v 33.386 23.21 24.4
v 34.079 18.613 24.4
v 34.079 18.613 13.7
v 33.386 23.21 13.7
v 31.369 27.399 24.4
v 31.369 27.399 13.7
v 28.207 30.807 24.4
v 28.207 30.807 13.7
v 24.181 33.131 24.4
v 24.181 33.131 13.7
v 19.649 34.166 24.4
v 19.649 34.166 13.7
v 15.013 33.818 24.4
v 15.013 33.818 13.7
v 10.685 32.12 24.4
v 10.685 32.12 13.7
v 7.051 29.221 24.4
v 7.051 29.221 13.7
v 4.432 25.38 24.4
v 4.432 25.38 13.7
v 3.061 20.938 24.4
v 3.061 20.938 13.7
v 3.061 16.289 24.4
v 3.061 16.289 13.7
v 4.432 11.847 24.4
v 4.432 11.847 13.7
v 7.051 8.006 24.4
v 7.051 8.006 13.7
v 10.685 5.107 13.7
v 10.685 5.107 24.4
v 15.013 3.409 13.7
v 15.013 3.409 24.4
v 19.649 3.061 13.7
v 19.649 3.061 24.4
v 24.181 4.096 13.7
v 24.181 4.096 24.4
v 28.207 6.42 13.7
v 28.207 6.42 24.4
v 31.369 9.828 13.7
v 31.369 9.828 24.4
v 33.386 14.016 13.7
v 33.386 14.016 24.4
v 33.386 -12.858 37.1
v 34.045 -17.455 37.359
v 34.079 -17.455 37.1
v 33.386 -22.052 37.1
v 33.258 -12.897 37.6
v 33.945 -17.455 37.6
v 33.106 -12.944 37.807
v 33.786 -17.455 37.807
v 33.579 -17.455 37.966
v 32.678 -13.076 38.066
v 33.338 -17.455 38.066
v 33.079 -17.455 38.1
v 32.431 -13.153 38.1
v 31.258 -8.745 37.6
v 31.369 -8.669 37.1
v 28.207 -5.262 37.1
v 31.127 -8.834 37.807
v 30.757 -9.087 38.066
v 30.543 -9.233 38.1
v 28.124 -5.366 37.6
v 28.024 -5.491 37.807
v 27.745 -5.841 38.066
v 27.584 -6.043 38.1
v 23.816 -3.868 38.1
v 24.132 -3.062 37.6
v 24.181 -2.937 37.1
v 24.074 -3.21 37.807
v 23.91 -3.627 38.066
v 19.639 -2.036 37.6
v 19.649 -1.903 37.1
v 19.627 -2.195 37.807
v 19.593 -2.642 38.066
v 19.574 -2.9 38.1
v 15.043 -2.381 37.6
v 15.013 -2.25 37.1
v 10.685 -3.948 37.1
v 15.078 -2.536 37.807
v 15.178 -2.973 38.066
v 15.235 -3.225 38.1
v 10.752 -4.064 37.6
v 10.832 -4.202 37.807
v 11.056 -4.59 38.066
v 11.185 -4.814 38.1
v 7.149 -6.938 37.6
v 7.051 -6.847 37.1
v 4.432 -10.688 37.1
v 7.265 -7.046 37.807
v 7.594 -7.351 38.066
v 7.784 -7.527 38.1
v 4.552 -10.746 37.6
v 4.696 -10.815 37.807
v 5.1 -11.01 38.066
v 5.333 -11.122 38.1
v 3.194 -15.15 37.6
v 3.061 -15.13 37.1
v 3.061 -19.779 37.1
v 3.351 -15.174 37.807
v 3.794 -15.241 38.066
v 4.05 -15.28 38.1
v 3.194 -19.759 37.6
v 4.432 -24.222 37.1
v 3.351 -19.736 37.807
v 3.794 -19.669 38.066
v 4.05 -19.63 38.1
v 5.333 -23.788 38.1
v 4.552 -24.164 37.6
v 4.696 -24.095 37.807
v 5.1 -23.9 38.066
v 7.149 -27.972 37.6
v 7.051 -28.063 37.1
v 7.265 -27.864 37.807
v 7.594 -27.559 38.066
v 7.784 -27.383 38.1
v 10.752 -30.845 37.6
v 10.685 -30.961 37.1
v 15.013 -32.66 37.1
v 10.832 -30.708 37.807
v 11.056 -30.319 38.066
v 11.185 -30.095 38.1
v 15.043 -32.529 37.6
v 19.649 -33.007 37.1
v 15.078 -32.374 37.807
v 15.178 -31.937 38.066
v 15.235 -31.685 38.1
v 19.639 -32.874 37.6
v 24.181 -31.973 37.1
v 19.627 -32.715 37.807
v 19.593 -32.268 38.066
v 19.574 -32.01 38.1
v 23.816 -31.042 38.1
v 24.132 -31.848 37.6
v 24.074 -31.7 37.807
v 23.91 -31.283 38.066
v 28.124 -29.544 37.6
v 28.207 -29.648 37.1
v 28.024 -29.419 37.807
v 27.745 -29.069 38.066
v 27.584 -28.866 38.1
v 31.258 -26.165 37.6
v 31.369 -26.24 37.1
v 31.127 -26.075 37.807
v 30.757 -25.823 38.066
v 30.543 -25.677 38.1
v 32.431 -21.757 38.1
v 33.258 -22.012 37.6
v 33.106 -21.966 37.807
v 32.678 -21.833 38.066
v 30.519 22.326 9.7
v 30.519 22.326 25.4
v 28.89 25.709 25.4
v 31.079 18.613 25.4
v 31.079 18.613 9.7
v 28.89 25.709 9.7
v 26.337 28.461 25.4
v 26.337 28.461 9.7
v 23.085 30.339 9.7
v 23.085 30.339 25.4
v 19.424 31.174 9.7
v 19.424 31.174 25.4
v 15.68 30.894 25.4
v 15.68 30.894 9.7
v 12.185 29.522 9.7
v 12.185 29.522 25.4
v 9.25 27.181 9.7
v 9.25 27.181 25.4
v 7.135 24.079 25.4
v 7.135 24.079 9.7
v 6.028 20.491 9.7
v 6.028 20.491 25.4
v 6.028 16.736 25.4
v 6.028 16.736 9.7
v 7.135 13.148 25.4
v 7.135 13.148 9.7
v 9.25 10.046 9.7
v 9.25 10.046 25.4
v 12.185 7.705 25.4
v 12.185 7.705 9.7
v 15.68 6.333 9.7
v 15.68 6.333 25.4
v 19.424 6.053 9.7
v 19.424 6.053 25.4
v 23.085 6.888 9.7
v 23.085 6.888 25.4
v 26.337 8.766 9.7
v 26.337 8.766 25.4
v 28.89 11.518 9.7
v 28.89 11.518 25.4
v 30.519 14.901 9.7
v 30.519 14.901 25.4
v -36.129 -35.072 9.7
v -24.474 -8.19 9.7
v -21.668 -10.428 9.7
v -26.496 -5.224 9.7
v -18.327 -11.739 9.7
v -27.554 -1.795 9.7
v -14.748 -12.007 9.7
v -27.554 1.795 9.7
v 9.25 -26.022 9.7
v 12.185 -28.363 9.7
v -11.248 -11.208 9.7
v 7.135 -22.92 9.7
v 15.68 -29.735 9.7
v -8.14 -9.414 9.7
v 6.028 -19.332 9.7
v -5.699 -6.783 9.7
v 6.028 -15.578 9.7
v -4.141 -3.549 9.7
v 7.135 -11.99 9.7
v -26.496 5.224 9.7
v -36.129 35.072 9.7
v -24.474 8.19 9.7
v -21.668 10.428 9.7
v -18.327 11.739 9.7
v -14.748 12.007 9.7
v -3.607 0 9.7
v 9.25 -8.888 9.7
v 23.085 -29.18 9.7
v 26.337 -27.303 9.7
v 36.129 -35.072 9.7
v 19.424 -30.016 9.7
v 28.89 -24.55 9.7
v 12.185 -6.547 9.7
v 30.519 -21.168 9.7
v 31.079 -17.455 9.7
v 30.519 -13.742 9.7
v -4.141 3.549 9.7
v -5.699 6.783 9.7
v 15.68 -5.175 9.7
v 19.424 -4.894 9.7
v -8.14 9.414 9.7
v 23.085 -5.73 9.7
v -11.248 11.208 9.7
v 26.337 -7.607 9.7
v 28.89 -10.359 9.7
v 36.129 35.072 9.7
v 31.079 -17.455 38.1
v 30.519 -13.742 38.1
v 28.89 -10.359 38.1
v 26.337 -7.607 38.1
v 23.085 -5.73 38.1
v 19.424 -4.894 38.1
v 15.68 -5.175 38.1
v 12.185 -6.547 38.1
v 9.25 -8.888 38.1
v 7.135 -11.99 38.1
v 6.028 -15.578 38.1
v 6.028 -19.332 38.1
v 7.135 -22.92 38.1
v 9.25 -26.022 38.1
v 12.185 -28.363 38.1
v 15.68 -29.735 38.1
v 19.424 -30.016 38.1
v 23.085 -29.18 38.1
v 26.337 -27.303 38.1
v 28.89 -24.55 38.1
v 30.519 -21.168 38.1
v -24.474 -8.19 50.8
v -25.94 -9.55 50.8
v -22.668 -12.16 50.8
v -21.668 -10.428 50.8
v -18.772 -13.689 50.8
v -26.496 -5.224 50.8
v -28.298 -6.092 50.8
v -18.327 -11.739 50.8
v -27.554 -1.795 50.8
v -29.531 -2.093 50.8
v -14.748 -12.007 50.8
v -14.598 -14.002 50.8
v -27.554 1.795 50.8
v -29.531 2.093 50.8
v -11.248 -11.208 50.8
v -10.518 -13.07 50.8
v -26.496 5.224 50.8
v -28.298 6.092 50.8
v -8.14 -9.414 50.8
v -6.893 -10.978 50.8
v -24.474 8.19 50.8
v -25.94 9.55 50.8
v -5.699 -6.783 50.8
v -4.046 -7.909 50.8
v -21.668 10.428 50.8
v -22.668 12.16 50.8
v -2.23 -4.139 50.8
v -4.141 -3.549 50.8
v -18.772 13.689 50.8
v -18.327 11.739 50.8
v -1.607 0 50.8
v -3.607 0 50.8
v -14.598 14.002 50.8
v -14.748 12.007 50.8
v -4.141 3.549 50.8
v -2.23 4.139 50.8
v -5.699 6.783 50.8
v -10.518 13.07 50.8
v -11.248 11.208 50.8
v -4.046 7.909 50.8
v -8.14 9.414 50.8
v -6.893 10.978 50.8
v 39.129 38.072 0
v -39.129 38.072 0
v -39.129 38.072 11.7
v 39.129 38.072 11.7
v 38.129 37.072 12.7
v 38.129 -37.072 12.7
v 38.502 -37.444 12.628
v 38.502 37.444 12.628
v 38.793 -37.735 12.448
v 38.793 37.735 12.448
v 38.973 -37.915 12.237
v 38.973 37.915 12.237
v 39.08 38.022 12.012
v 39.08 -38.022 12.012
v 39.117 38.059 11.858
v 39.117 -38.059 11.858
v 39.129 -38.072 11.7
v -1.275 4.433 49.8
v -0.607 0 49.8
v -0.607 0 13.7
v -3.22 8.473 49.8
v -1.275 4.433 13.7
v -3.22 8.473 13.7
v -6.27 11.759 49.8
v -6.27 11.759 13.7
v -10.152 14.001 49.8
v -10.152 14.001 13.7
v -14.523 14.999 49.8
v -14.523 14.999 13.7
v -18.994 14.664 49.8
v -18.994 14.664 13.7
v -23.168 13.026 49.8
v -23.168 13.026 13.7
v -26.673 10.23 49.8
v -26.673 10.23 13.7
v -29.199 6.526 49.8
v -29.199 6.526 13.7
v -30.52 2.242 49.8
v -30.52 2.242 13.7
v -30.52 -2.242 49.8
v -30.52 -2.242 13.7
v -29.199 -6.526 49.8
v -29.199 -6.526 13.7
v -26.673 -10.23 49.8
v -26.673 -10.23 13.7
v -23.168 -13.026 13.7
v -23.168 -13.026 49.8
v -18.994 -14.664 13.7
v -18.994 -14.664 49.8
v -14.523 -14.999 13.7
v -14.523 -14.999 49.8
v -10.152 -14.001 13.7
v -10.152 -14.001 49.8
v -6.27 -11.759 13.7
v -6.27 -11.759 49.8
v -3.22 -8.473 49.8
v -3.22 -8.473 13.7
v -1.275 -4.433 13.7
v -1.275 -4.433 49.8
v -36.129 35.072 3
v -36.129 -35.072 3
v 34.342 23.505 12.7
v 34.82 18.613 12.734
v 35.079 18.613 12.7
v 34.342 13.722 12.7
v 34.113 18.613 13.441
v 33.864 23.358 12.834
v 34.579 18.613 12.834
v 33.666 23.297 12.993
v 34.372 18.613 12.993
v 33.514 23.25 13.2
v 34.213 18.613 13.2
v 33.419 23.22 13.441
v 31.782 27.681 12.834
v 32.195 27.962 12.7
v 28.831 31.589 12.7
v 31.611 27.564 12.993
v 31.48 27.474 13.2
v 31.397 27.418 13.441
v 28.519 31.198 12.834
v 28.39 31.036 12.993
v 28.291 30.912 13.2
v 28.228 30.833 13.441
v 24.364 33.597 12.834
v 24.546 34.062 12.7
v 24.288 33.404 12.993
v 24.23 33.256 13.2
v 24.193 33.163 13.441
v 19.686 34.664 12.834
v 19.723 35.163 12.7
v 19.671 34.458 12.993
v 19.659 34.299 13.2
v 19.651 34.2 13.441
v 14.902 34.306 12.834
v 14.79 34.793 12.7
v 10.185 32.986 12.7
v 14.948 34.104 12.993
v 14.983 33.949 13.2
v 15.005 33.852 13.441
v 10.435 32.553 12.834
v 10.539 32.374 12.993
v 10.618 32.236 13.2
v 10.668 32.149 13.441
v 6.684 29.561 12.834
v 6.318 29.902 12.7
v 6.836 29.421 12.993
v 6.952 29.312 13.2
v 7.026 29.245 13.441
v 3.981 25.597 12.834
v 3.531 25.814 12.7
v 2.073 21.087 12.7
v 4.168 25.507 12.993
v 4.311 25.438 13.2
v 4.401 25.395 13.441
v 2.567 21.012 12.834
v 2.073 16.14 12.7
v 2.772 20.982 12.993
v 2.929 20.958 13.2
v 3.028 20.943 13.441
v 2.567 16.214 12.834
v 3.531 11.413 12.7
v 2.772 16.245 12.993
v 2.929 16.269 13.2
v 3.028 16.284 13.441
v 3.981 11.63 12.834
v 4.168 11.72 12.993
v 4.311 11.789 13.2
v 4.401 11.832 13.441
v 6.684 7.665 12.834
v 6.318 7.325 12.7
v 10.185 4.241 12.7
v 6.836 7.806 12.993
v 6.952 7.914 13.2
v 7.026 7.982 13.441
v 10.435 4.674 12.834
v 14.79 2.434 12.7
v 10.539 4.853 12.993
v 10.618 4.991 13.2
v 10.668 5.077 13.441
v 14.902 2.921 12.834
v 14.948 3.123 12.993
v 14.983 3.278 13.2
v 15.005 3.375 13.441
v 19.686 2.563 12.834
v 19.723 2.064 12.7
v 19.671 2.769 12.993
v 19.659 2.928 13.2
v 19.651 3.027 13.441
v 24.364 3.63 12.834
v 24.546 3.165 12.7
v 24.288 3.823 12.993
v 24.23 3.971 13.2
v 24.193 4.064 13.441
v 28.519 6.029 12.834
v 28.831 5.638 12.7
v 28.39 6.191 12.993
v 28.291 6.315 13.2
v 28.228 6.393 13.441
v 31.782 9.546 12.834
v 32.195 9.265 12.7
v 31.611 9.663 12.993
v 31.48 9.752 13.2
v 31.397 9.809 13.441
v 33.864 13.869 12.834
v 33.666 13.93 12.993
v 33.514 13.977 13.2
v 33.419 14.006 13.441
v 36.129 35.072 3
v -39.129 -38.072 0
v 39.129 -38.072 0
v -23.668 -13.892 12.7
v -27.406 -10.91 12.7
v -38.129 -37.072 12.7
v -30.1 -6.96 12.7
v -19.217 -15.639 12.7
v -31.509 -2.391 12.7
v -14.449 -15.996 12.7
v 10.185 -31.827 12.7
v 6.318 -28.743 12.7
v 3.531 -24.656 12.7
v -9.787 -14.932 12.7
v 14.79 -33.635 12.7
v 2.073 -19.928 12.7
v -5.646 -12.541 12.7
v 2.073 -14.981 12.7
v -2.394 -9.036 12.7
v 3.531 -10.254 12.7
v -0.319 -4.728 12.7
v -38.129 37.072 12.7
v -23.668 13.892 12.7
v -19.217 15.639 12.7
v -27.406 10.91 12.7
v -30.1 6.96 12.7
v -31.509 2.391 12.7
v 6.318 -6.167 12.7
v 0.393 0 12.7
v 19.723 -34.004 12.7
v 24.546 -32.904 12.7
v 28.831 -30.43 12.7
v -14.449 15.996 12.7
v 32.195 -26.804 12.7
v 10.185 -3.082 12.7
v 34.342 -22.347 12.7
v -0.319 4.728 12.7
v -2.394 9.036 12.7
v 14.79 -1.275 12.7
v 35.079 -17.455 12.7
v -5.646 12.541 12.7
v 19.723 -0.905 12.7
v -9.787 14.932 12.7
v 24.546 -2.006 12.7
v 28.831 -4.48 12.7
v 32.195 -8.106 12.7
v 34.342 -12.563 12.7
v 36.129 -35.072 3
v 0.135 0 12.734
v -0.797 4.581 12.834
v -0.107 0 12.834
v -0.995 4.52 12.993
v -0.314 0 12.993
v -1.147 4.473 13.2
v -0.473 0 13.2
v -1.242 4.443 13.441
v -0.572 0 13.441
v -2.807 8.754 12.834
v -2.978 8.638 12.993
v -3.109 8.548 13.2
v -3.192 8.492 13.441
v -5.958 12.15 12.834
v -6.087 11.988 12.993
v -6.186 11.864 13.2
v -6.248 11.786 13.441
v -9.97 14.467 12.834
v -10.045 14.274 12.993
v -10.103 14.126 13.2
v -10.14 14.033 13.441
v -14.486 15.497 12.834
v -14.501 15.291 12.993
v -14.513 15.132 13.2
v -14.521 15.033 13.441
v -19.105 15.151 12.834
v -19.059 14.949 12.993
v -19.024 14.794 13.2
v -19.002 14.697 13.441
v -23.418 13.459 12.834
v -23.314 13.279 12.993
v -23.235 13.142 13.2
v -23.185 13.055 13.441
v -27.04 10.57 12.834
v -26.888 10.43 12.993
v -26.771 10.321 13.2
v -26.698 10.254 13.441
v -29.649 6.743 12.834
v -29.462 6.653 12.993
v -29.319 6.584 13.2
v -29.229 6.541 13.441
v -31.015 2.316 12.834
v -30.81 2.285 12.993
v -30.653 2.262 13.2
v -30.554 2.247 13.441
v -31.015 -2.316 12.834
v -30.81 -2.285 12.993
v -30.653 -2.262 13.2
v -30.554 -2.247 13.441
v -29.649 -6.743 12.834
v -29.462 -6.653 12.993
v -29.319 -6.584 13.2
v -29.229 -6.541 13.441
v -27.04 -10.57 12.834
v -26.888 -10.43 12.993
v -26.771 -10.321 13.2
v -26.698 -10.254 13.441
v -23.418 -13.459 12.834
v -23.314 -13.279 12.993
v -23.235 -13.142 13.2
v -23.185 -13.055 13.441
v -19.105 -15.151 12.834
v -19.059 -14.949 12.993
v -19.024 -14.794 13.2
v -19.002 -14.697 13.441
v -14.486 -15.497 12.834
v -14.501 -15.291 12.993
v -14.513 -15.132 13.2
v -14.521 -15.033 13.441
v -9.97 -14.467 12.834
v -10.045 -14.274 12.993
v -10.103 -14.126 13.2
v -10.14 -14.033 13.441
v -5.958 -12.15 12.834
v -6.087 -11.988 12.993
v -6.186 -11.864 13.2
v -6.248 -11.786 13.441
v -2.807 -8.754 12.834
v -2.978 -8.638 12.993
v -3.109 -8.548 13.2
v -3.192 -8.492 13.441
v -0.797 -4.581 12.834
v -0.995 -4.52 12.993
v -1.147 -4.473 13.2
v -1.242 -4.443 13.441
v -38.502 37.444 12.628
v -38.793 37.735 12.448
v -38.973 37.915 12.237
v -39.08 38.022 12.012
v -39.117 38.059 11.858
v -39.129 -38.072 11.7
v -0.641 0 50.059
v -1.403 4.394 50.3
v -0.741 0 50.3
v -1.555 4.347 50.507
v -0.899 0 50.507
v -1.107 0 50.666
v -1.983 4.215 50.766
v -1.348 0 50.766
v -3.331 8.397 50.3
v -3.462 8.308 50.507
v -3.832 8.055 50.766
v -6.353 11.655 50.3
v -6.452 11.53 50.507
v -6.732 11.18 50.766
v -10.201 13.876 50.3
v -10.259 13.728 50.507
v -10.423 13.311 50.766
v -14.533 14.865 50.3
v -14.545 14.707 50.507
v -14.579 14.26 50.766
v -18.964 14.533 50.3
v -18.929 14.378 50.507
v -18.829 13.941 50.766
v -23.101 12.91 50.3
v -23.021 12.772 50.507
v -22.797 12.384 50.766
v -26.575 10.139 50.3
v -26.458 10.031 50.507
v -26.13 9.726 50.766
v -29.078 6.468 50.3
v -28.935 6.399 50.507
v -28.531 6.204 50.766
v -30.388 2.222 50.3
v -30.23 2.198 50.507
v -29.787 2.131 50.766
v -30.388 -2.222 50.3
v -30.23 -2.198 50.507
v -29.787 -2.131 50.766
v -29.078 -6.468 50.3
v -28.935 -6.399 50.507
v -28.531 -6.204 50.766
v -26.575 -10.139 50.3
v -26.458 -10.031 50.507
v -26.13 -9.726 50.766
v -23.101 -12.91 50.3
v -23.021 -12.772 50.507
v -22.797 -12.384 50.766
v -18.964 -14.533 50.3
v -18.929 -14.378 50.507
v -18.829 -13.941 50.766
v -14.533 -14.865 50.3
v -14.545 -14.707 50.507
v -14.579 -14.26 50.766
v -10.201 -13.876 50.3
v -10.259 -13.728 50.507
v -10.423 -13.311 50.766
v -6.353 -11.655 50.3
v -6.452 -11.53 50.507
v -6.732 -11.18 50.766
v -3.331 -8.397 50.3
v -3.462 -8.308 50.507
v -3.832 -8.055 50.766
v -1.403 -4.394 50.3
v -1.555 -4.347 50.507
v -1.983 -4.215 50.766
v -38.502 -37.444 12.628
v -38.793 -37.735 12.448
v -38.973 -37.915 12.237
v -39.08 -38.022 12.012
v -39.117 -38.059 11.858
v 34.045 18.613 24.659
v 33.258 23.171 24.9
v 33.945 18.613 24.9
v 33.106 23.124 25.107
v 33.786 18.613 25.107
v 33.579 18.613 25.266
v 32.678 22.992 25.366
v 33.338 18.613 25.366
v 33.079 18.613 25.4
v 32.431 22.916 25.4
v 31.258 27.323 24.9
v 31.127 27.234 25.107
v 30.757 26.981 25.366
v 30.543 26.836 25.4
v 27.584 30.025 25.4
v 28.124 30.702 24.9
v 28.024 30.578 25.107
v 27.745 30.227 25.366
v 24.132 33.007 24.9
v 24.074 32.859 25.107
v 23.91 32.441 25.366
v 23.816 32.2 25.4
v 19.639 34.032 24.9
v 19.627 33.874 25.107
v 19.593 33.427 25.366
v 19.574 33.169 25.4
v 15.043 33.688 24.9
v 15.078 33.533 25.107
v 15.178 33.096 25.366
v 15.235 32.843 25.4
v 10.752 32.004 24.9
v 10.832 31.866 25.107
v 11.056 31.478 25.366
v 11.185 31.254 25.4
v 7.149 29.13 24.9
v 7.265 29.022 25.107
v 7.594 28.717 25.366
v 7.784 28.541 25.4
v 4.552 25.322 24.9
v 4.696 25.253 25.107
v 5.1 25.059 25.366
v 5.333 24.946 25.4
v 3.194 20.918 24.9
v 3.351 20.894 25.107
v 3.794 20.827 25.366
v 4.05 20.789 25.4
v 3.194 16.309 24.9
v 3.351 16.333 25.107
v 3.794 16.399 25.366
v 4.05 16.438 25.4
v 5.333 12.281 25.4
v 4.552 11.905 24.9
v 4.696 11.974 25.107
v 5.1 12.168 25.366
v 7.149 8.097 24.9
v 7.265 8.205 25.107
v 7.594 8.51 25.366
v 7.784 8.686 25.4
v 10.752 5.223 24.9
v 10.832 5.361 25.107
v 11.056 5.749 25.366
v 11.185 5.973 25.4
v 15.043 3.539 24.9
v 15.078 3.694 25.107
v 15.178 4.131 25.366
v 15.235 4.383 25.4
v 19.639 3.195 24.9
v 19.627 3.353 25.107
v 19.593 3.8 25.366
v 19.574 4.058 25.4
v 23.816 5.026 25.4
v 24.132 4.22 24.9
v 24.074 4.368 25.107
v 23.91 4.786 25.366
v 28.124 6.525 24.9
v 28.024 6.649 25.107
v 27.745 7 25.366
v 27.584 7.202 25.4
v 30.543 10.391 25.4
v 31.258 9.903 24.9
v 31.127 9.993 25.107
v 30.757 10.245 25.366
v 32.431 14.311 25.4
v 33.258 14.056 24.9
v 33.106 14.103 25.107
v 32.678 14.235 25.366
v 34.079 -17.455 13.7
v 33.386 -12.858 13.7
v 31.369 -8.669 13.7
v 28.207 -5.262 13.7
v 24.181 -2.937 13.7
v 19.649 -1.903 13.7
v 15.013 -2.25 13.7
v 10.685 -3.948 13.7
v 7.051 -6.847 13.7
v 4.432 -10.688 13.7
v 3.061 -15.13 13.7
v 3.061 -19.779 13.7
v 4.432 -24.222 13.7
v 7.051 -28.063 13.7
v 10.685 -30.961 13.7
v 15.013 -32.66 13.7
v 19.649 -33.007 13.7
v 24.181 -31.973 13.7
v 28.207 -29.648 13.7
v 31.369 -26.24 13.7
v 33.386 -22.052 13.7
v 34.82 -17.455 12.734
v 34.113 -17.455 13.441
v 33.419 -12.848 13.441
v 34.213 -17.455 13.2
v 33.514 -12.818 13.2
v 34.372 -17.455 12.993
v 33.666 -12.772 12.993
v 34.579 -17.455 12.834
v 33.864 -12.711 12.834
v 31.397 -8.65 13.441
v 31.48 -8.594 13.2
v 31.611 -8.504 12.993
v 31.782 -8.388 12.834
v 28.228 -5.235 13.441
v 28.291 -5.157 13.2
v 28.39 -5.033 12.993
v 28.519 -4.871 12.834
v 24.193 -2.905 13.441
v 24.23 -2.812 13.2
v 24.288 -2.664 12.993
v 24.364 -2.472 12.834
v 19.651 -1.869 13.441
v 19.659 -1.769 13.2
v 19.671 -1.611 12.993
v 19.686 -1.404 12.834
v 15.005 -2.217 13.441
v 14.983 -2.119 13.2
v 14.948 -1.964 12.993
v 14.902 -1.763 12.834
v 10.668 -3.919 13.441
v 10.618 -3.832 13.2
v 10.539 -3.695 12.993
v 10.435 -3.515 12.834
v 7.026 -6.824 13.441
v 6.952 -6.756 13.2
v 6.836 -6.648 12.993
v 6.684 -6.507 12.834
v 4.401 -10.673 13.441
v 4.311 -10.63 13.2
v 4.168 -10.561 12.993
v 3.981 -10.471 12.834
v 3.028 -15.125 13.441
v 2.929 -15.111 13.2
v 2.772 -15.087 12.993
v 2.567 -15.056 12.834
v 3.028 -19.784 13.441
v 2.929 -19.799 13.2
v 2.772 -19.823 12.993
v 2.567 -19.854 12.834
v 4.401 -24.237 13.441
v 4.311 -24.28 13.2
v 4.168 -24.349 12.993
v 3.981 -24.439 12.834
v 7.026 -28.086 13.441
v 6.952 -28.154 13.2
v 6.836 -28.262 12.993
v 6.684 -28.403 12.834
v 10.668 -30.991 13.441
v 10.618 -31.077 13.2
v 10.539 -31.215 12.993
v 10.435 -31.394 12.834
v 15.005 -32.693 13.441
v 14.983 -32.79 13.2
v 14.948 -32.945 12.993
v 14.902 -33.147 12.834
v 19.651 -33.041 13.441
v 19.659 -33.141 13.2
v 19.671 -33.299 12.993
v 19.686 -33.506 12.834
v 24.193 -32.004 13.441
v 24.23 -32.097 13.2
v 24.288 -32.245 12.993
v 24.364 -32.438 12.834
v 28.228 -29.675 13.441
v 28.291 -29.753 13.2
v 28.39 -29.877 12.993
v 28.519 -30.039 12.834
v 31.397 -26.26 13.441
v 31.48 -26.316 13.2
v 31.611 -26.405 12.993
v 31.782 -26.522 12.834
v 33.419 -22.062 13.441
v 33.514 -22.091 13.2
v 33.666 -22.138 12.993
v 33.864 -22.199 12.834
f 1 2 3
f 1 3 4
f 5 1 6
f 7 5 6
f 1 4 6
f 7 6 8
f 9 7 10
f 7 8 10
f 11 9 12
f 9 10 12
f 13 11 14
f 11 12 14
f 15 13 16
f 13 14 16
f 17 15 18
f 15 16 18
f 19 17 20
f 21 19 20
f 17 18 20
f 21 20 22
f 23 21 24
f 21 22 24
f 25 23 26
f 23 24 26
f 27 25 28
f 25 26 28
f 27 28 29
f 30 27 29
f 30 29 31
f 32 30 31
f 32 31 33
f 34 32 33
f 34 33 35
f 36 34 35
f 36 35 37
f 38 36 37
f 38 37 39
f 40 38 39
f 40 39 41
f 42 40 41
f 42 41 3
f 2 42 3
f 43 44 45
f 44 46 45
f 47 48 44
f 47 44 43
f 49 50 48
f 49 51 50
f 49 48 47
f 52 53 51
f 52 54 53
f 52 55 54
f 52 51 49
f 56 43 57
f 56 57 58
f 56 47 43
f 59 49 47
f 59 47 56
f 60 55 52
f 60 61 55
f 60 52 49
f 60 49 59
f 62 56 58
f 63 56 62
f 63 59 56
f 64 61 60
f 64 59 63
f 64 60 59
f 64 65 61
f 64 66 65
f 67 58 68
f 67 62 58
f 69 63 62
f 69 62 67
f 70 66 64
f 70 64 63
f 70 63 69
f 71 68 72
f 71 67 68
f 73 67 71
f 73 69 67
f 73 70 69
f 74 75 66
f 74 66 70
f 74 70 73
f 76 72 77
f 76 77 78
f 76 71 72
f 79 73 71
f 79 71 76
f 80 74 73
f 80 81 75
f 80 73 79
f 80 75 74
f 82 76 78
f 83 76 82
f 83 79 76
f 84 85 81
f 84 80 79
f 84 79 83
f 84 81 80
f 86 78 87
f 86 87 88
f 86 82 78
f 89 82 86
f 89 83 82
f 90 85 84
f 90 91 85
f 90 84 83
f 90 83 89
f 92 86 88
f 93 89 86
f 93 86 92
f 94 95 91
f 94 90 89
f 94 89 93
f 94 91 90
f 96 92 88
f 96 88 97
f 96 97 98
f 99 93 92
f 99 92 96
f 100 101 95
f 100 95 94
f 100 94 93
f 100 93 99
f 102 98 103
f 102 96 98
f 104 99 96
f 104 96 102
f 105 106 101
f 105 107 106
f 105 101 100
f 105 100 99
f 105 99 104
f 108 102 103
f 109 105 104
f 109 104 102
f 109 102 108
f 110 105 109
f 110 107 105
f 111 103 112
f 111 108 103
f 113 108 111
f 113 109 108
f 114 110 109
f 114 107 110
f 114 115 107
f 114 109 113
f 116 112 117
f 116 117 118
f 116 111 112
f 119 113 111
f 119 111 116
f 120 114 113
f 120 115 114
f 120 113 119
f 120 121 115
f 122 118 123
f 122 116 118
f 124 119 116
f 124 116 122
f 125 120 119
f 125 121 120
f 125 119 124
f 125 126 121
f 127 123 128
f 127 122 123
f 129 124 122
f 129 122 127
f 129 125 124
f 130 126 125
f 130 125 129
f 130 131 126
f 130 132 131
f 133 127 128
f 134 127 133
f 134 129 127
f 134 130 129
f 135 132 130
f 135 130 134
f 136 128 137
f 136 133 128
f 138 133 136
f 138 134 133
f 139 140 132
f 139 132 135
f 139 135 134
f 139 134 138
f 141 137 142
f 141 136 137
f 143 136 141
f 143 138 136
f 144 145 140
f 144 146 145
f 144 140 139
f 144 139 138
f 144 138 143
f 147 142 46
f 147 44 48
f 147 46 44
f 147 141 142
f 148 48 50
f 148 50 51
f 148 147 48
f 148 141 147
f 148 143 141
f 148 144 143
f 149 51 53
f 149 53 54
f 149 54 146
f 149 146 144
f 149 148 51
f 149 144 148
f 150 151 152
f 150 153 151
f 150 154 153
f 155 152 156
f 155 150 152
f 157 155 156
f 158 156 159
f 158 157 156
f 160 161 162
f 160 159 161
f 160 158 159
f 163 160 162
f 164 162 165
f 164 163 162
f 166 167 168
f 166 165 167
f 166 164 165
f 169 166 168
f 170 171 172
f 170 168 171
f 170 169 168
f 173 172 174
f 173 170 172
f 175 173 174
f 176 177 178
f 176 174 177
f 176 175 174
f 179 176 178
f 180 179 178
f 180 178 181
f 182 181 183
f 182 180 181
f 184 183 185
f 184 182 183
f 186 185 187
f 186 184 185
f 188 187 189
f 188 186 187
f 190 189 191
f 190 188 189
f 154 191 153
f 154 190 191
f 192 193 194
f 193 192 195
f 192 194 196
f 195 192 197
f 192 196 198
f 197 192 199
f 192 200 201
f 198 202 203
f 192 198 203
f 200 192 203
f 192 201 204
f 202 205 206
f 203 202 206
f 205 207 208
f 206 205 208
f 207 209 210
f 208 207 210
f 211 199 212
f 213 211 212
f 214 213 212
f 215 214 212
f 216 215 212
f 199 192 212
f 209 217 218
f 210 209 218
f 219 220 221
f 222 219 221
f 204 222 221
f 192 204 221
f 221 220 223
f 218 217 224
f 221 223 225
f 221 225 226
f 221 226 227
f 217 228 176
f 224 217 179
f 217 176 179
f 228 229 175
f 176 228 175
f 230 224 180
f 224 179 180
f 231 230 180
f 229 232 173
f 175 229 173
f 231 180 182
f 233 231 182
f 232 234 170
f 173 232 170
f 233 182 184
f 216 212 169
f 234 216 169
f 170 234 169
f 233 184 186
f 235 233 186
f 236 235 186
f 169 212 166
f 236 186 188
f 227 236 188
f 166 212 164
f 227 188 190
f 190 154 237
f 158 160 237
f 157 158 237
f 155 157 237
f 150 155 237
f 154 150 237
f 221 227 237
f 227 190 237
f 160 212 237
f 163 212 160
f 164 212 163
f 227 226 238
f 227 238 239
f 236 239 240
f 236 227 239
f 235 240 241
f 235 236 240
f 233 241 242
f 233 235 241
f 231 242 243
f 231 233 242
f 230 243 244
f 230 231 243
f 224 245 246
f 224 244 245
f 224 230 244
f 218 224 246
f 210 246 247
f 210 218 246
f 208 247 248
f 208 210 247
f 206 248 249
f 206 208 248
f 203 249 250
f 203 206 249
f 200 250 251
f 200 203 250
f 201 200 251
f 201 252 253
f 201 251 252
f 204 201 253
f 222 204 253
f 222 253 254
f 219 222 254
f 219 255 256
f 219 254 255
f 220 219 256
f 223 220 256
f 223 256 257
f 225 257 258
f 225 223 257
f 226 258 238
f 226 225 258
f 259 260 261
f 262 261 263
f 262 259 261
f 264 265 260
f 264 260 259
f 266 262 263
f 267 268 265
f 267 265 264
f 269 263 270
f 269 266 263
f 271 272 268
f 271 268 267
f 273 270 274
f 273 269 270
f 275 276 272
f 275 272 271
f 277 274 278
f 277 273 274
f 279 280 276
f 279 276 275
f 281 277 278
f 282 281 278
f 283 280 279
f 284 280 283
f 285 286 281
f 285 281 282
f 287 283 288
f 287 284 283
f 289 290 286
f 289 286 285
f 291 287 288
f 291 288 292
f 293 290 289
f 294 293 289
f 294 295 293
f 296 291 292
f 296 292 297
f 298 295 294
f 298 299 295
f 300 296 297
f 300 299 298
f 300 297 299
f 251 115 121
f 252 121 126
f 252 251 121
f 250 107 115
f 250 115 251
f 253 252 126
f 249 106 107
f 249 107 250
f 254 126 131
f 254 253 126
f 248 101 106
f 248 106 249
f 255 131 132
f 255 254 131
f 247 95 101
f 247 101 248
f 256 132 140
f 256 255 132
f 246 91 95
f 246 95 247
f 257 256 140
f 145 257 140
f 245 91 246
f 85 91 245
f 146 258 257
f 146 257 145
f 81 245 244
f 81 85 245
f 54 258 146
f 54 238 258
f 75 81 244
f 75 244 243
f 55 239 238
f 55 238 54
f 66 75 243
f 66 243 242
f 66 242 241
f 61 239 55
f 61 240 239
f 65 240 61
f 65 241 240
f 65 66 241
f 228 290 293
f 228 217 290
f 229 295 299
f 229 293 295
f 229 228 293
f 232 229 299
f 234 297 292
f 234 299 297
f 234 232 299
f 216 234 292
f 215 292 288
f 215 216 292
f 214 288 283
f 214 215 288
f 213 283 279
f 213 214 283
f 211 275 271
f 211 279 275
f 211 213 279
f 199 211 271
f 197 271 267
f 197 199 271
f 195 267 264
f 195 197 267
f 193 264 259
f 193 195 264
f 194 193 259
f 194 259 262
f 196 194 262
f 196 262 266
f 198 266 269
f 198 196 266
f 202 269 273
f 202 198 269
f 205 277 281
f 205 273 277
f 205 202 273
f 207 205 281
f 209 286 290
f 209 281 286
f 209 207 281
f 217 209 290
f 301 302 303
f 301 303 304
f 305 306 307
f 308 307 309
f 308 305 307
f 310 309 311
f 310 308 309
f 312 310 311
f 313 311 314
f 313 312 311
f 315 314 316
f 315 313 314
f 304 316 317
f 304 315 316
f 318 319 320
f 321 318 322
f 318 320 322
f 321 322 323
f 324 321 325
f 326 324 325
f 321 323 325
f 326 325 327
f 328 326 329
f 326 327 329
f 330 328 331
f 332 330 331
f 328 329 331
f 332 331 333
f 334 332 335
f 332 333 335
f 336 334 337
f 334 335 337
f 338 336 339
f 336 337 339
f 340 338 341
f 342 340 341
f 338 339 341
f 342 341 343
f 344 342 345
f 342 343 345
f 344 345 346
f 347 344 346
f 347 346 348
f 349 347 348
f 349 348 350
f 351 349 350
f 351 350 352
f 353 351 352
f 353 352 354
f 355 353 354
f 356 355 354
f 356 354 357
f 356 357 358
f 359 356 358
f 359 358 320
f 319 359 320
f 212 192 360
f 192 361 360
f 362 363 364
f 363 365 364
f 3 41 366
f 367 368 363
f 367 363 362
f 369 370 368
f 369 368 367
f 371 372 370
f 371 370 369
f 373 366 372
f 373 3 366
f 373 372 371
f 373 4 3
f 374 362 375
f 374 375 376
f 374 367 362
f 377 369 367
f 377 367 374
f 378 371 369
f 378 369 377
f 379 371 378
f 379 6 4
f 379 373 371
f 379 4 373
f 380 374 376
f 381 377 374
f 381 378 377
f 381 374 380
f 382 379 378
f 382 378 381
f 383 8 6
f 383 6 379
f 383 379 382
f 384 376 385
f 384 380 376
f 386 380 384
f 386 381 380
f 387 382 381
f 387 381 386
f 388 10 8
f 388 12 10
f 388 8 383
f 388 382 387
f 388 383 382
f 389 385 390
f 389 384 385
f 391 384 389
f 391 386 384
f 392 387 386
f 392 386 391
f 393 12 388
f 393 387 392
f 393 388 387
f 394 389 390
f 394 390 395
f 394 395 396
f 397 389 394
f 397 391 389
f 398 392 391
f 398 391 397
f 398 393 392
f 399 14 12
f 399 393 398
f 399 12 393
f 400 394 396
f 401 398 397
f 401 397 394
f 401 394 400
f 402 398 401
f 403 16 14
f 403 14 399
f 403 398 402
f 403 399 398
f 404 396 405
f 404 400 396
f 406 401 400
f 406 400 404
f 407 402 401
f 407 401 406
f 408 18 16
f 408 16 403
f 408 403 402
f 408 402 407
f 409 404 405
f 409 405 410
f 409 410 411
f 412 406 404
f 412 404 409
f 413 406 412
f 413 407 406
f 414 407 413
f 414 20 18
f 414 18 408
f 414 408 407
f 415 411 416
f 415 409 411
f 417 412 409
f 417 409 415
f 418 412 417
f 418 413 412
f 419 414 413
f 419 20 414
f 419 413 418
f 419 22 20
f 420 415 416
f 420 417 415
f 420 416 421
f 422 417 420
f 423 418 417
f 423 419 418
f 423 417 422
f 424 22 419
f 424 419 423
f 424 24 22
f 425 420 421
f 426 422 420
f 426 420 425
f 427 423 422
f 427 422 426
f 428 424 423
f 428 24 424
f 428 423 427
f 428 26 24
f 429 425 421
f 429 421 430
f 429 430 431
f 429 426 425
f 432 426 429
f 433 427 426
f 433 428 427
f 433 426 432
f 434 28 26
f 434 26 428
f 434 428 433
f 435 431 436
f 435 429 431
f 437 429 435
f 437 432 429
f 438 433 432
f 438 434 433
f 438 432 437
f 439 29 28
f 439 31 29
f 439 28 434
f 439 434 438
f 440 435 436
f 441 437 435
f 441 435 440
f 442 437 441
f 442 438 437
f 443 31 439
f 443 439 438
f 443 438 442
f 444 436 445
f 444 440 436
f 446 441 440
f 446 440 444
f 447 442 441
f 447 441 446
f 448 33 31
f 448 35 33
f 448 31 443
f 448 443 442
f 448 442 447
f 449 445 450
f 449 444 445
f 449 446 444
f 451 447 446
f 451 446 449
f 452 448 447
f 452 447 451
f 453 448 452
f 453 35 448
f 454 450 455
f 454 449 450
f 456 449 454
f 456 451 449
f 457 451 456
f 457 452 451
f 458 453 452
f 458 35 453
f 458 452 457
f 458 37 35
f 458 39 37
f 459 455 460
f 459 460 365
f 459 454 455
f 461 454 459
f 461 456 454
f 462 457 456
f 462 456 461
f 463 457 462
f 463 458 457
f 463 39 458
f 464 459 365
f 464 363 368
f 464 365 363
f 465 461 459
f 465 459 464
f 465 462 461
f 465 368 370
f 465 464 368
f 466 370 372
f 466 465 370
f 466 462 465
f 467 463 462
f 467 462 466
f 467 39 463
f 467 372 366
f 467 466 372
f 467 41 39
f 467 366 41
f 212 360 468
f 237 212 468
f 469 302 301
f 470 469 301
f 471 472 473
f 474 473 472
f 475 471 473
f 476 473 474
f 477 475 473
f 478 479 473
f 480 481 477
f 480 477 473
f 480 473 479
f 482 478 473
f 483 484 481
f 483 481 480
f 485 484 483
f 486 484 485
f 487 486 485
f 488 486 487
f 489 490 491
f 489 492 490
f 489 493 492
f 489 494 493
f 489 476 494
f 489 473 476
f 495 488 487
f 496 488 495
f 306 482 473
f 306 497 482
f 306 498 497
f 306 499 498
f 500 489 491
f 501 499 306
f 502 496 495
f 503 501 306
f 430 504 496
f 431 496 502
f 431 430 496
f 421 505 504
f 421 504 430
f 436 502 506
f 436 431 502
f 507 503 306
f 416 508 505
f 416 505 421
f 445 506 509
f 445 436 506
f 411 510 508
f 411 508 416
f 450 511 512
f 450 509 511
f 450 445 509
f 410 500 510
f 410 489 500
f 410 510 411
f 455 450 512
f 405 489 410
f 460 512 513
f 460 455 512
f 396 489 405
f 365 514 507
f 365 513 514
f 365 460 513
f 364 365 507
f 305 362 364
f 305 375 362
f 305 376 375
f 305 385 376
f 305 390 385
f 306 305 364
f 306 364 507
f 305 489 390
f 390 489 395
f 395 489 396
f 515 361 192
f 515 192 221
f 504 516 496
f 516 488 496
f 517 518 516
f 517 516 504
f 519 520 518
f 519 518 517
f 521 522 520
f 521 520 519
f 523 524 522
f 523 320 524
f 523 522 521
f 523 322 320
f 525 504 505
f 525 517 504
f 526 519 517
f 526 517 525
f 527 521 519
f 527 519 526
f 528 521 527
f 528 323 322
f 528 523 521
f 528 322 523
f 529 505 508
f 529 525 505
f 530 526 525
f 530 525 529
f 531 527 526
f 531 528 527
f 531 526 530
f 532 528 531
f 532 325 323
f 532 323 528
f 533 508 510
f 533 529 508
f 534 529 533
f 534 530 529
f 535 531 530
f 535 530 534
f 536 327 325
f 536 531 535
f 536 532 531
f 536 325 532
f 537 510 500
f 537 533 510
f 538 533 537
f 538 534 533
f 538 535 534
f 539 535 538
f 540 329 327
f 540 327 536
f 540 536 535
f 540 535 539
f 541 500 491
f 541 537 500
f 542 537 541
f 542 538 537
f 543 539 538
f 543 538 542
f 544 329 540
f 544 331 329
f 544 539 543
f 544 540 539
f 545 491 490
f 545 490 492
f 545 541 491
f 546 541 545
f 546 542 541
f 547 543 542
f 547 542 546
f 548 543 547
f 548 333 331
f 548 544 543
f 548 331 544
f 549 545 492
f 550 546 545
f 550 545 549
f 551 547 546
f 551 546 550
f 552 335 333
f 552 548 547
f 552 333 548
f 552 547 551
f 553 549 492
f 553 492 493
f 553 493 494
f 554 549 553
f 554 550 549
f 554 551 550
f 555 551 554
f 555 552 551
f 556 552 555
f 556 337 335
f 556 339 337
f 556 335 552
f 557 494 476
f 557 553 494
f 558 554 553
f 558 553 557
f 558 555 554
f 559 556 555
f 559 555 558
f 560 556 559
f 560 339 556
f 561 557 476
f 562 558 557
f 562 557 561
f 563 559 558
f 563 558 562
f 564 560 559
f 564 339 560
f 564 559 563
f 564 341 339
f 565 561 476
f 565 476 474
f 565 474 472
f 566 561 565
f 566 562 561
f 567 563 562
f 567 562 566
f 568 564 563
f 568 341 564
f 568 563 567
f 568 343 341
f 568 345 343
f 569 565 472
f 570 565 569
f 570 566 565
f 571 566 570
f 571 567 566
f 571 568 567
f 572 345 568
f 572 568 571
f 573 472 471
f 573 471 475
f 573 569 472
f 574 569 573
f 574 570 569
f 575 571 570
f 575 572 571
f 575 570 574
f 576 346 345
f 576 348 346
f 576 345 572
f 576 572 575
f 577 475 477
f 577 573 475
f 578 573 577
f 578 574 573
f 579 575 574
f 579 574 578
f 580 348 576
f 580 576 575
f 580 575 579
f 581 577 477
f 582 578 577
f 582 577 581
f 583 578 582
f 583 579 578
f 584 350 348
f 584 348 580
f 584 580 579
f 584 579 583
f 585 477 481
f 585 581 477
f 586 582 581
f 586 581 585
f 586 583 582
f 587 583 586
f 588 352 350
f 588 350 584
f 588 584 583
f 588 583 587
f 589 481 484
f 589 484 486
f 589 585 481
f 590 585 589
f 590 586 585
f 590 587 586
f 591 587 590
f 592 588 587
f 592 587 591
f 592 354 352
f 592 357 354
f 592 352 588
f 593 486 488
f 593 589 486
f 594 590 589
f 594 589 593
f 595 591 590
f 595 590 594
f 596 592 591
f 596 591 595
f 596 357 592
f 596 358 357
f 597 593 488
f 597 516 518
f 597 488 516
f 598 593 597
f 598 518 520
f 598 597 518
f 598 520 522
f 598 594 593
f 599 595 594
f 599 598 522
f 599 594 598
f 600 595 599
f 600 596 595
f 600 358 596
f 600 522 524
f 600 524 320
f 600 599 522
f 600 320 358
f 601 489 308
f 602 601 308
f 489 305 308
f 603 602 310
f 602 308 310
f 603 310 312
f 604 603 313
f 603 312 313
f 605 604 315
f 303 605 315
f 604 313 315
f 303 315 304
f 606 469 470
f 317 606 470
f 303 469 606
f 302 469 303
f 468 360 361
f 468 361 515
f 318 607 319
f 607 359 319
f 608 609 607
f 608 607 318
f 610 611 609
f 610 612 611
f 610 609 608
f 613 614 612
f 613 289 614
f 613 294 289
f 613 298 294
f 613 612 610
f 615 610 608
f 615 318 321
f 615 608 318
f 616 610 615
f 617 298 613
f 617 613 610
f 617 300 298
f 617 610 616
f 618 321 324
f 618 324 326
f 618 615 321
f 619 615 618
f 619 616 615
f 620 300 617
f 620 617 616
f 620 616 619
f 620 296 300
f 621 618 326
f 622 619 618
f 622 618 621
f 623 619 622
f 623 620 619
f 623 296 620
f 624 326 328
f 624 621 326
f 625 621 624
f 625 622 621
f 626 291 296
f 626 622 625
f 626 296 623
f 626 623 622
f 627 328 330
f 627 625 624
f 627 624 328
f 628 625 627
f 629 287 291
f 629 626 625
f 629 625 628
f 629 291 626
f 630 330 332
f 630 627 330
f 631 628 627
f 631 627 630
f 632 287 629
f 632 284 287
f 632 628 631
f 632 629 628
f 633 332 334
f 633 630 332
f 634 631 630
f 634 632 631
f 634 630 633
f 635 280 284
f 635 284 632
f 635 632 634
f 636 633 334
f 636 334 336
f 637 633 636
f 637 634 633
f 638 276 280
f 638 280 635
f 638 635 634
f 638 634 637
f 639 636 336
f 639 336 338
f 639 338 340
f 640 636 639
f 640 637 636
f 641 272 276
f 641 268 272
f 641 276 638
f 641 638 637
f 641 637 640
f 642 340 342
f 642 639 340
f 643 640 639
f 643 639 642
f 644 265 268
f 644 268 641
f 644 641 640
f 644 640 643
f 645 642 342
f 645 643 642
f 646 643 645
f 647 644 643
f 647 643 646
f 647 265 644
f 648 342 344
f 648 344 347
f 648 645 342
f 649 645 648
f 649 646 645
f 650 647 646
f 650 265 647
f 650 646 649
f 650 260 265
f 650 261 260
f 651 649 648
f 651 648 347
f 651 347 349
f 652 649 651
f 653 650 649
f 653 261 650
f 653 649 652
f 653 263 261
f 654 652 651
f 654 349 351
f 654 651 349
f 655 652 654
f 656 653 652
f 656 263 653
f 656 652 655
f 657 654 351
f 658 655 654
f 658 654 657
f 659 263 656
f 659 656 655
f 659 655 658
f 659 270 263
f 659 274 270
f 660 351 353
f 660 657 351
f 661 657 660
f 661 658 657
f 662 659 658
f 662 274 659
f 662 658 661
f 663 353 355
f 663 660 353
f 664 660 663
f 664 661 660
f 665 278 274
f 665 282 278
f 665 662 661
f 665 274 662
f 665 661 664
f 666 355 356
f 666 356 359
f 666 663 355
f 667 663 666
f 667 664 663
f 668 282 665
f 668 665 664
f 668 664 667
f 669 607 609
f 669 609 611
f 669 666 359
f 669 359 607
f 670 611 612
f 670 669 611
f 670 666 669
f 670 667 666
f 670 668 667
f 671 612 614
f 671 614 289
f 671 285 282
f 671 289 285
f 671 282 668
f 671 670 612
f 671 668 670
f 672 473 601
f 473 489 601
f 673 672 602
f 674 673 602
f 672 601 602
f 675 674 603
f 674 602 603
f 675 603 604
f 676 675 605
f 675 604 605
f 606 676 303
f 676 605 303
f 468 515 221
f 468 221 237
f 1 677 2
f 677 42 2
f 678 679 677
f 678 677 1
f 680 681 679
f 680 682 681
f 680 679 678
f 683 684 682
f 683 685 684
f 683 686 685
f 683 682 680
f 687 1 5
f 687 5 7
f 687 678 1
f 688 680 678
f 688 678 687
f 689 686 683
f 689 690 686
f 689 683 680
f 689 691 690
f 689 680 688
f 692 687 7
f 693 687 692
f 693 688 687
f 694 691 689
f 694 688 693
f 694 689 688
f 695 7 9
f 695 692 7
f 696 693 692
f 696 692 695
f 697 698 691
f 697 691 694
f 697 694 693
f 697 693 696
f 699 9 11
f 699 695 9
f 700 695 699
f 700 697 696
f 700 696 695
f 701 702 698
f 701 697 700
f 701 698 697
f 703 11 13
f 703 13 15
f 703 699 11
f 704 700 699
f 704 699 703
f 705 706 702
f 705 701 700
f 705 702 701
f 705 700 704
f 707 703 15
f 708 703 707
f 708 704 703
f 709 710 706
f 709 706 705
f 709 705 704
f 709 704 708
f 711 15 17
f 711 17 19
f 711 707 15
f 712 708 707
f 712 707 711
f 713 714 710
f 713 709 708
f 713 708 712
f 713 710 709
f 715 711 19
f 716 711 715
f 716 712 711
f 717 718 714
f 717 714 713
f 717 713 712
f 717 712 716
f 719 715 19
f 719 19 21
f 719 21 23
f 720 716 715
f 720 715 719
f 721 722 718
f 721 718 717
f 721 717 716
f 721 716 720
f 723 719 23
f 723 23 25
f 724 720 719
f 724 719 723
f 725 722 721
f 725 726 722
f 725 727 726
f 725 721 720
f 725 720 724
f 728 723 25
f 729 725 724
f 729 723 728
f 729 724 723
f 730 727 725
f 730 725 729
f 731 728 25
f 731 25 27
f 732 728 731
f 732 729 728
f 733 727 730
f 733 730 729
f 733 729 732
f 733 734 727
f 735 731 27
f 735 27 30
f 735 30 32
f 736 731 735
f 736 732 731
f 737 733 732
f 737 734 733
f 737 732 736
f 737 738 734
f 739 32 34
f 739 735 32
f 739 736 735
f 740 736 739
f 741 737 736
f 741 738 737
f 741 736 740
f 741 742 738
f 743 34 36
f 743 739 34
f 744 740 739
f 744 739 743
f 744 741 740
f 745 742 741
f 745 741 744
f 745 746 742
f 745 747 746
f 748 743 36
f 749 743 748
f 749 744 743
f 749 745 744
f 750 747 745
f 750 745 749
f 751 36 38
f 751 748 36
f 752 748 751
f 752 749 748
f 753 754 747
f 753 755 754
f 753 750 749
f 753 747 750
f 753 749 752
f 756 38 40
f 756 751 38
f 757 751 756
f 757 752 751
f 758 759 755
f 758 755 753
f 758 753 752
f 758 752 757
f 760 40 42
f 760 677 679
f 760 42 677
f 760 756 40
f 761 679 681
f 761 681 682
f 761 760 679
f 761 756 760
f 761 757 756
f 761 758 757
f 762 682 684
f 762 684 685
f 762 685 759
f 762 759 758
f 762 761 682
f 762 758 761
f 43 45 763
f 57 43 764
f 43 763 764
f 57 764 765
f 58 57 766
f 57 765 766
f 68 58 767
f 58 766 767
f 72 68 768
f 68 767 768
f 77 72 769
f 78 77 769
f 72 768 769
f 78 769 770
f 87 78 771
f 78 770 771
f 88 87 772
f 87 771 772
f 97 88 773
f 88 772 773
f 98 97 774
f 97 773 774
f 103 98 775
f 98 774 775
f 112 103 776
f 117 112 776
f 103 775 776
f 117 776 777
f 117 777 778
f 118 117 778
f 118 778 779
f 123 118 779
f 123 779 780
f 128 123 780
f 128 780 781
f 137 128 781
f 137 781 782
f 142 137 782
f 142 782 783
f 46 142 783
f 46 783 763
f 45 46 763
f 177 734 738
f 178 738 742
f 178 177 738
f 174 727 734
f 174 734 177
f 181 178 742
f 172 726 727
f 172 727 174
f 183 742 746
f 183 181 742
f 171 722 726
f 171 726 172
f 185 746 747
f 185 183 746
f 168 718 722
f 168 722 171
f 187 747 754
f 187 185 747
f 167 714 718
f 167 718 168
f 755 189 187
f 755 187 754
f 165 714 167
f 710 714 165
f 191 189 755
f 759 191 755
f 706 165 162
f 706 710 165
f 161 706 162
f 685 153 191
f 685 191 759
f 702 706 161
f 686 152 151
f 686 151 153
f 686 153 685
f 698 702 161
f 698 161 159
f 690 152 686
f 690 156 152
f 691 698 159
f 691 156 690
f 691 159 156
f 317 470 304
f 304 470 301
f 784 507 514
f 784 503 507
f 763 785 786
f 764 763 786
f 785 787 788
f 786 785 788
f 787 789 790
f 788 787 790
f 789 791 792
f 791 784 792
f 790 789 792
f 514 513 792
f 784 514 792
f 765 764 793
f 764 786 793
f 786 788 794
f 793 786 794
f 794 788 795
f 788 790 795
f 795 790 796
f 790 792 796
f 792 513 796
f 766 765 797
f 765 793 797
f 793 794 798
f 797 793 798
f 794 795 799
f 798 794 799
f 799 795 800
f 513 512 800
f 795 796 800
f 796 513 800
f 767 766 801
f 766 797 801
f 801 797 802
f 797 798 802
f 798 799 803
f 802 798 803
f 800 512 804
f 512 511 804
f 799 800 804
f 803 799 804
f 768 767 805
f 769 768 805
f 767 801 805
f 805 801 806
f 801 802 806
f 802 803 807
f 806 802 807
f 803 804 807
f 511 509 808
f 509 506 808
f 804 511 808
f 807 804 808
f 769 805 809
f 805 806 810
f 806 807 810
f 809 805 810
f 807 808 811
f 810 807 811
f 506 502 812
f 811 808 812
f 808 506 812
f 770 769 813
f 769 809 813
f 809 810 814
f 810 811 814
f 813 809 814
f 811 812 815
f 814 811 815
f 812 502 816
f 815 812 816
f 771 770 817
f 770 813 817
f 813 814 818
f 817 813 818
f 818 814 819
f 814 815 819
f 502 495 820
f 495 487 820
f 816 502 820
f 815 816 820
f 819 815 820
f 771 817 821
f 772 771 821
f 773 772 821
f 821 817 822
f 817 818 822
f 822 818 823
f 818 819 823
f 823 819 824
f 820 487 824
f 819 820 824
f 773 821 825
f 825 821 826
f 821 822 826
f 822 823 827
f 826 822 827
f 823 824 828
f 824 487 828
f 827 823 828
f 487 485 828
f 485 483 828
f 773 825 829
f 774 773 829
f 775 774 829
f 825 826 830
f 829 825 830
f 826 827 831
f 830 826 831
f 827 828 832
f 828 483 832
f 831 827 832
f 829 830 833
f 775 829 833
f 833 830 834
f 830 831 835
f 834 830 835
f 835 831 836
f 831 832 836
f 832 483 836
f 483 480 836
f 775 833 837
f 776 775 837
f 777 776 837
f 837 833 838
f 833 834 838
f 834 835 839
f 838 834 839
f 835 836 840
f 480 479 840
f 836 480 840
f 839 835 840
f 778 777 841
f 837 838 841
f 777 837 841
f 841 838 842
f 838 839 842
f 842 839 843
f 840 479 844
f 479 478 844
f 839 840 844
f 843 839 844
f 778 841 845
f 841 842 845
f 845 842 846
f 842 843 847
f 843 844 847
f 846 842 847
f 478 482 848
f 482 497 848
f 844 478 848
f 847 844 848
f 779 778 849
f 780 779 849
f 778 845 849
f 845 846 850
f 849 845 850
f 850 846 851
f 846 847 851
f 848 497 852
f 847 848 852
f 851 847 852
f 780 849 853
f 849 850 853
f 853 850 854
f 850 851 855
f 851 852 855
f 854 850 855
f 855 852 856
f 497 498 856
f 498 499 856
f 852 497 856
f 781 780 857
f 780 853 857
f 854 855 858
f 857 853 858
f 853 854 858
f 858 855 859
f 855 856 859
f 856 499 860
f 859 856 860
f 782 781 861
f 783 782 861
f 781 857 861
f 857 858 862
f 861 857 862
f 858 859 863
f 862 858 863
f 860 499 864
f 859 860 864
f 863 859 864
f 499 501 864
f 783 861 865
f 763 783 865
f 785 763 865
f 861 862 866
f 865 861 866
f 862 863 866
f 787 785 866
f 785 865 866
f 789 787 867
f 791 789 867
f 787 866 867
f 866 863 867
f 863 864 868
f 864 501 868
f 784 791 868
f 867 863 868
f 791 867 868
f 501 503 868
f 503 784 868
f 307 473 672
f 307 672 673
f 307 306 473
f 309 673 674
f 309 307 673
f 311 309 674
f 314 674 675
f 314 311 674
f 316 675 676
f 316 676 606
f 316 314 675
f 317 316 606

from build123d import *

# Parameters (mm, degrees)
F0_W     = 78.2586932182
F0_H     = 76.1436074972
F0_R     = 15.5959109901
F0_R_2   = 15.0407765594
F2_DEPTH = 12.7
F1_R     = 15.0407765594
F1_R_2   = 15.5959109901
F3_DEPTH = 25.4
F4_DEPTH = 25.4
F5_DEPTH = 12.7
F6_T     = -3
F7_R     = 1


with BuildPart() as f2:
    # F0 (on Top) → F2 (new body)
    with BuildSketch(Plane.XY):
        Rectangle(F0_W, F0_H)
        with Locations((18.483184278, -17.4549240619)):
            Circle(F0_R, mode=Mode.SUBTRACT)
        with Locations((-15.6473219395, 0)):
            Circle(F0_R_2, mode=Mode.SUBTRACT)
        with Locations((18.483184278, 18.6134420495)):
            Circle(F0_R, mode=Mode.SUBTRACT)
    extrude(amount=F2_DEPTH)

    # F1 (on face) → F3 (join)
    with BuildSketch(Plane.XY):
        with Locations((-15.6473219395, 0)):
            Circle(F1_R)
        with Locations((18.483184278, 18.6134420495)):
            Circle(F1_R_2)
        with Locations((18.483184278, -17.4549240619)):
            Circle(F1_R_2)
    extrude(amount=F3_DEPTH)

    # F4 (add): a face of the model
    f4_faces = [f2.faces().sort_by_distance(p)[0] for p in [
        (-15.6473219395, 0, 25.4),
    ]]
    extrude(f4_faces, amount=F4_DEPTH)

    # F5 (add): a face of the model
    f5_faces = [f2.faces().sort_by_distance(p)[0] for p in [
        (18.483184278, -17.4549240619, 25.4),
    ]]
    extrude(f5_faces, amount=F5_DEPTH)

    # F6
    f6_openings = [f2.faces().sort_by_distance(p)[0] for p in [
        (-15.647322, 0, 50.8),
        (18.483184, -17.454924, 38.1),
        (18.483184, 18.613442, 25.4),
    ]]
    offset(amount=F6_T, openings=f6_openings, kind=Kind.INTERSECTION)

    # F7
    f7_edges = [f2.edges().sort_by_distance(p)[0] for p in [
        (-30.688098, 0, 12.7),
        (-0.606545, 0, 31.75),
        (-30.688098, 0, 50.8),
        (2.887273, -17.454924, 12.7),
        (34.079095, -17.454924, 25.4),
        (2.887273, -17.454924, 38.1),
        (2.887273, 18.613442, 12.7),
        (34.079095, 18.613442, 19.05),
        (2.887273, 18.613442, 25.4),
        (39.129347, 0, 12.7),
        (0, 38.071804, 12.7),
        (-39.129347, 0, 12.7),
        (0, -38.071804, 12.7),
    ]]
    fillet(f7_edges, radius=F7_R)


solid = f2.part
